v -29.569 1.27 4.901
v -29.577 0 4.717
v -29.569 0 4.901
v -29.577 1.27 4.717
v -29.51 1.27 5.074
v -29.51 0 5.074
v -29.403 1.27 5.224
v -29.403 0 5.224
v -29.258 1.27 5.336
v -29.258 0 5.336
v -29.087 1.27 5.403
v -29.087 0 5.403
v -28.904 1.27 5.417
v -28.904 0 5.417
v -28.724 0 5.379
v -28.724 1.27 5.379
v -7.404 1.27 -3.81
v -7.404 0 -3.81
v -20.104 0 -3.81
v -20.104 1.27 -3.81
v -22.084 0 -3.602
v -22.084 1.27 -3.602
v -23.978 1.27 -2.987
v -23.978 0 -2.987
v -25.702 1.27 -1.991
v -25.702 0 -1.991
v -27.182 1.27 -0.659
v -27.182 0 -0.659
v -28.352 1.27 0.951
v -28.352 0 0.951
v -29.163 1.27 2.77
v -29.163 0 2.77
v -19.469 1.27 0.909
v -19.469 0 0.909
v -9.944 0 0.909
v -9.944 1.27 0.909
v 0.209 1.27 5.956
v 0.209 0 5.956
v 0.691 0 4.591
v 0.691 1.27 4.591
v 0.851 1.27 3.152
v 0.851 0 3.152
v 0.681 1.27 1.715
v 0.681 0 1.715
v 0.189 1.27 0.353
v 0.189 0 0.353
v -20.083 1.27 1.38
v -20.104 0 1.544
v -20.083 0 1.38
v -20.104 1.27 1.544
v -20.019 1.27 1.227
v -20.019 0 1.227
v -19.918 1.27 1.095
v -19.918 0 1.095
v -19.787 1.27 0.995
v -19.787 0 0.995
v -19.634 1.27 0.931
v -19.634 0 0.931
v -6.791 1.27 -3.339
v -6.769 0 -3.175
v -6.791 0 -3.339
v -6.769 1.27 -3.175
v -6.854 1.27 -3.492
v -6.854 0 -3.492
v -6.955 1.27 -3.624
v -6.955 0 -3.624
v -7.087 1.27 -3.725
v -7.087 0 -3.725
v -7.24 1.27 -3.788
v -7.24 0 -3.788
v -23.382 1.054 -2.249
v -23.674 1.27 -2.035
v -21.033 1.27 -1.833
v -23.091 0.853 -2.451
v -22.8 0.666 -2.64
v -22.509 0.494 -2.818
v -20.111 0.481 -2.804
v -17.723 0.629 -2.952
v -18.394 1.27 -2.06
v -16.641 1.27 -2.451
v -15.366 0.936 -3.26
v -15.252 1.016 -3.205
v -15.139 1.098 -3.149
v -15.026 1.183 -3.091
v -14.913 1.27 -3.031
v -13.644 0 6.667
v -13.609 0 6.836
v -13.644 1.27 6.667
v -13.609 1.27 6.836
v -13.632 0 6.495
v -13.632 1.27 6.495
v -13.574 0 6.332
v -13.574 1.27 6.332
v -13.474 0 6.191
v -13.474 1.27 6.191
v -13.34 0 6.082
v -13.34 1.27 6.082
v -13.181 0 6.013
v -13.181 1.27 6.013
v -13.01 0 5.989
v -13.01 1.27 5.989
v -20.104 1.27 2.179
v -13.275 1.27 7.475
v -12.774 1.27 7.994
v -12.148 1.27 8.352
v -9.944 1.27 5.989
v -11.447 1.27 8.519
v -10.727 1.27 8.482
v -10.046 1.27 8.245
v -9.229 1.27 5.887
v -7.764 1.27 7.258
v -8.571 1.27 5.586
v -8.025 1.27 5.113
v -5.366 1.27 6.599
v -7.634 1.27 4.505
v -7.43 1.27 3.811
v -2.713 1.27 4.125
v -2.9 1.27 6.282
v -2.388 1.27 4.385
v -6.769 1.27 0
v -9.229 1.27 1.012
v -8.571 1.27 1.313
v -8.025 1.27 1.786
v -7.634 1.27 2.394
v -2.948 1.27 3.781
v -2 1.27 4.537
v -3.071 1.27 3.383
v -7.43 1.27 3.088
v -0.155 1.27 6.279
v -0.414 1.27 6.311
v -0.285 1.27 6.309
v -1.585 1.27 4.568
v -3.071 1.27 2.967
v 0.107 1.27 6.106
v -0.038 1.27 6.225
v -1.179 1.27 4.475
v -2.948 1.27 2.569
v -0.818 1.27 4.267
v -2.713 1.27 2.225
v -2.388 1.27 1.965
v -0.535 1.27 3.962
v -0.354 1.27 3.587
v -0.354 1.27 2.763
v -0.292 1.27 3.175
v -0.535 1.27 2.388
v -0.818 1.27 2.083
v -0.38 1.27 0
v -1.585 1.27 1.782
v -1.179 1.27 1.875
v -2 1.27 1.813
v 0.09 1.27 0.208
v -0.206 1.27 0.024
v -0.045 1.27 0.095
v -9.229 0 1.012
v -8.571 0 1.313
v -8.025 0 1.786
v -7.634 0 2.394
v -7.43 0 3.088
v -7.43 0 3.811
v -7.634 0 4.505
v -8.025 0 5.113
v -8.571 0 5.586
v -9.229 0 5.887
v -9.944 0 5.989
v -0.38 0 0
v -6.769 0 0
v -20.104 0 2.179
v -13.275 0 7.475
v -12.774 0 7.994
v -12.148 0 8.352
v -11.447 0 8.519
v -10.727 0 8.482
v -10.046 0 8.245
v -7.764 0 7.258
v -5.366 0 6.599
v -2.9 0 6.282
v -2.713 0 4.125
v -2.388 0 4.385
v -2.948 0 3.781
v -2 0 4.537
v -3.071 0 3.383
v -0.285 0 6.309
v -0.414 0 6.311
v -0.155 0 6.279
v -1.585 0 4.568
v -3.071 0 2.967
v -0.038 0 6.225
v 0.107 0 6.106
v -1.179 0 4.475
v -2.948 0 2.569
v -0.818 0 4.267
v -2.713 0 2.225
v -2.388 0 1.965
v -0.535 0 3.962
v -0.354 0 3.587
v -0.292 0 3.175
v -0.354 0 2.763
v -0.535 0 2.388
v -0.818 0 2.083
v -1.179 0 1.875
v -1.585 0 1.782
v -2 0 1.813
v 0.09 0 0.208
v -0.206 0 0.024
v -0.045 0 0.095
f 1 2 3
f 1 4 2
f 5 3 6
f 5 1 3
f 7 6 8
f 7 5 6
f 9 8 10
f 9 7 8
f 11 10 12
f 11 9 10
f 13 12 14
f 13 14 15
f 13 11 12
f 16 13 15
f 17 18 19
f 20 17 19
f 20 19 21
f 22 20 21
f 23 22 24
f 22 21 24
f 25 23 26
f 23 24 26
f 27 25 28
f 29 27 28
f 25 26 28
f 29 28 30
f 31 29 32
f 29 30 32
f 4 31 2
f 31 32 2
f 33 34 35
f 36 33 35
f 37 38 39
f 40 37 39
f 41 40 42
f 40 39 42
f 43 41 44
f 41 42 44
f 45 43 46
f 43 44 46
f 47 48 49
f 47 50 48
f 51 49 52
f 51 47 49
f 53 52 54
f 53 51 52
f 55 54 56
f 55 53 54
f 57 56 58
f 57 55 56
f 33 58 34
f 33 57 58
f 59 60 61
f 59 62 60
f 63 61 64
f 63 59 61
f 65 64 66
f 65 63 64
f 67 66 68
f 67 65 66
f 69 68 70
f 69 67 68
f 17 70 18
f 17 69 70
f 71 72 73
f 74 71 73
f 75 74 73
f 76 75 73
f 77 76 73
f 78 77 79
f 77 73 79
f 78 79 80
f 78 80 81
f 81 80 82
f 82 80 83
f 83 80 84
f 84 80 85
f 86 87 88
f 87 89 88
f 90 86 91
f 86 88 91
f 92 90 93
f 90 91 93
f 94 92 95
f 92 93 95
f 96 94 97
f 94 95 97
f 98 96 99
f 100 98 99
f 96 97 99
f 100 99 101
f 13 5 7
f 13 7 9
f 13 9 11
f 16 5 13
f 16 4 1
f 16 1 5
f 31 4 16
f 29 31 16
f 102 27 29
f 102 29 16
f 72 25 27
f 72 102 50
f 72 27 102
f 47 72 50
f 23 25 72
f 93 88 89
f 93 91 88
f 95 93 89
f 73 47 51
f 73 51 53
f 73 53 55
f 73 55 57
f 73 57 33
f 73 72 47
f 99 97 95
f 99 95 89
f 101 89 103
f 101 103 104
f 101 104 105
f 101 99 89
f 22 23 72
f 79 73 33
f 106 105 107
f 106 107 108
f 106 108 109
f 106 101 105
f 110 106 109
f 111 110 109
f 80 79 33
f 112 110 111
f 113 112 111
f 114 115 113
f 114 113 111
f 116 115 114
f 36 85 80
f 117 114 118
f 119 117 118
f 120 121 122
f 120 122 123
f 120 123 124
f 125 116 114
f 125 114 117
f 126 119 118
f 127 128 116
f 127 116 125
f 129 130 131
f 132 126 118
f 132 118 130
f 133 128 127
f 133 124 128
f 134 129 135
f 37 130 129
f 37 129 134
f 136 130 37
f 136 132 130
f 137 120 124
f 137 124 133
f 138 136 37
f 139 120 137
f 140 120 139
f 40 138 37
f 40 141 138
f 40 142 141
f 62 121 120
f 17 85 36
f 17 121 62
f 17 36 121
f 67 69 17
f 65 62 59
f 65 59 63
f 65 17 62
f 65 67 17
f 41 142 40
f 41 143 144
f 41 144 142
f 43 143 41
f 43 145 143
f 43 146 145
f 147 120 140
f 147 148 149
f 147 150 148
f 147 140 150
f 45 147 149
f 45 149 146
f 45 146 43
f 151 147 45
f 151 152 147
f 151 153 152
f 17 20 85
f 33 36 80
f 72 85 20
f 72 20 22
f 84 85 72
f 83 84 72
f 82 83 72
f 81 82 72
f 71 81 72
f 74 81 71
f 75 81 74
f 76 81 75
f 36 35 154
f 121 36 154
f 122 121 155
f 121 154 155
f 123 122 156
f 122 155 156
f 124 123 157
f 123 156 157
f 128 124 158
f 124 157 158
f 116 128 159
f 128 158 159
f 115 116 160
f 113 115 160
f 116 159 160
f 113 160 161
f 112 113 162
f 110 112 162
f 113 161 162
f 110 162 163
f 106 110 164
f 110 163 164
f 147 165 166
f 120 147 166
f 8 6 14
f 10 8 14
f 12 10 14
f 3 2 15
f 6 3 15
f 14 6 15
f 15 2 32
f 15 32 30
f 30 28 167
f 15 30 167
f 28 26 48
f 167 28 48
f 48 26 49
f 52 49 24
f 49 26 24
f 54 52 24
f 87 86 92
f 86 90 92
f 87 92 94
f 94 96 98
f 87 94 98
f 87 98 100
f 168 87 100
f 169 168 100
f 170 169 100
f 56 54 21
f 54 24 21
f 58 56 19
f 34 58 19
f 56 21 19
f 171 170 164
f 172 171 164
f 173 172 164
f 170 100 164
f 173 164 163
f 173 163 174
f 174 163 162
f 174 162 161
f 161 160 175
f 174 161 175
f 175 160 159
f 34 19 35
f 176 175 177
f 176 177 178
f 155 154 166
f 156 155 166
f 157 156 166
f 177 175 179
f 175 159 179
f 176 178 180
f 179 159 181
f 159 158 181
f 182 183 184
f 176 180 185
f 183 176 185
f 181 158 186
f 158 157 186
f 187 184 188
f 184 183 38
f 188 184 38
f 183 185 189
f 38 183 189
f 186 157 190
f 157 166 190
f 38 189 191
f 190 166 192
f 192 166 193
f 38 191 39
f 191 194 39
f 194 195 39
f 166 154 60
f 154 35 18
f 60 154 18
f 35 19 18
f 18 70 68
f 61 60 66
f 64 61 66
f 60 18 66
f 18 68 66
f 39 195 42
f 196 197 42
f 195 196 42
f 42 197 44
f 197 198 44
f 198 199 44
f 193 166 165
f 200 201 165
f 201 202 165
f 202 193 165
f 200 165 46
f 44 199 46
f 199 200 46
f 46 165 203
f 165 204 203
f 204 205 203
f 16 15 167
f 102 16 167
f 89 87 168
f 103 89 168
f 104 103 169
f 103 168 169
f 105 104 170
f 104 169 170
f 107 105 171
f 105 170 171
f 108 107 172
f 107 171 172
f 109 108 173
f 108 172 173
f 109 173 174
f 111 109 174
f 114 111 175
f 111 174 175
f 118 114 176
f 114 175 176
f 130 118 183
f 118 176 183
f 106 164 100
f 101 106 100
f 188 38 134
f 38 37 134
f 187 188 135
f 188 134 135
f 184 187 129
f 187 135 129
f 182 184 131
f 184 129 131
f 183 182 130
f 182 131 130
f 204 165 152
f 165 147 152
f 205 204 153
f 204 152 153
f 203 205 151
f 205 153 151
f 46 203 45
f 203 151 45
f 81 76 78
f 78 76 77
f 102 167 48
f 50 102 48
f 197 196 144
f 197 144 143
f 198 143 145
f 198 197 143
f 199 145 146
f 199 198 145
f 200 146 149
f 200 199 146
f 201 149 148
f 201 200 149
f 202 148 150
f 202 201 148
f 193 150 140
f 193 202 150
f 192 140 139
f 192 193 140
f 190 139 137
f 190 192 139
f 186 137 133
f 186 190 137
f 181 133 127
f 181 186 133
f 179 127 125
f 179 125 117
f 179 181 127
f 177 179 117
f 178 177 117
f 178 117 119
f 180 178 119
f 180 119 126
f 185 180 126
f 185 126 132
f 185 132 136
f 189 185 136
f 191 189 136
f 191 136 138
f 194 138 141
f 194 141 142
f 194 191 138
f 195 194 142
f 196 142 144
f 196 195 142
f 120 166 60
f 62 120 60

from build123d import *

# Parameters (mm, degrees)
SKETCH1_R           = 1.397
BOSS_EXTRUDE1_DEPTH = 1.27
FILLET1_R           = 0.635
CUT_EXTRUDE3_DEPTH  = 2.286
CUT_EXTRUDE3_DRAFT  = -5


with BuildPart() as part:
    # Sketch1 → Boss-Extrude1 (new body)
    with BuildSketch(Plane(origin=(0, 0, 0), x_dir=(1, 0, 0), z_dir=(0, 1, 0))):
        with BuildLine():
            Line((0, 0), (-6.769261314, 0))
            Line((-6.769261314, 0), (-6.769261314, 3.81))
            Line((-6.769261314, 3.81), (-20.104261314, 3.81))
            ThreePointArc((-20.104261314, 3.81), (-26.839453405, 1.020192091), (-29.629261314, -5.715))
            Line((-29.629261314, -5.715), (-20.104261314, -2.17946963))
            Line((-20.104261314, -2.17946963), (-20.104261314, -0.90946963))
            Line((-20.104261314, -0.90946963), (-9.944261314, -0.90946963))
            ThreePointArc((-9.944261314, -0.90946963), (-7.404261314, -3.44946963), (-9.944261314, -5.98946963))
            Line((-9.944261314, -5.98946963), (-13.754261314, -5.98946963))
            ThreePointArc((-13.754261314, -5.98946963), (-12.534056747, -8.159663173), (-10.045804609, -8.244754297))
            ThreePointArc((-10.045804609, -8.244754297), (-5.162016489, -6.559807155), (0, -6.35))
            ThreePointArc((0, -6.35), (0.850738686, -3.175), (0, 0))
        make_face()
        with Locations((-1.689261314, -3.175)):
            Circle(SKETCH1_R, mode=Mode.SUBTRACT)
    extrude(amount=BOSS_EXTRUDE1_DEPTH)

    # Fillet1
    fillet1_edges = [part.edges().sort_by_distance(p)[0] for p in [
        (0, 0.635, 6.35),
        (-13.754261314, 0.635, 5.98946963),
        (-20.104261314, 0.635, 0.90946963),
        (-29.629261314, 0.635, 5.715),
        (-6.769261314, 0.635, -3.81),
        (0, 0.635, 0),
    ]]
    fillet(fillet1_edges, radius=FILLET1_R)


with BuildPart() as cut_extrude3_tool:
    # Sketch3 → Cut-Extrude3 (with draft: the straight prism first)
    with BuildSketch(Plane(origin=(0, 0.454734815, 0.454734815), x_dir=(1, 0, 0), z_dir=(0, 0.707106781, 0.707106781))):
        with BuildLine():
            ThreePointArc((-24.669594842, 2.353522249), (-18.89739116, 2.199678883), (-13.239594842, 3.353517673))
            Line((-13.239594842, 3.353517673), (-24.669594842, 2.353522249))
        make_face()
    extrude(amount=-CUT_EXTRUDE3_DEPTH)
    # Cut-Extrude3: the draft: its side faces are tilted about the plane it starts from
    cut_extrude3_sides = [cut_extrude3_tool.faces().sort_by_distance(p)[0] for p in [
        (-18.89739116, 1.201919619, -1.908896091),
        (-18.954594842, 1.664255078, -2.371231551),
    ]]
    draft(cut_extrude3_sides, Plane(origin=(0, 0.454734815, 0.454734815), x_dir=(1, 0, 0), z_dir=(0, 0.707106781, 0.707106781)), CUT_EXTRUDE3_DRAFT)


with BuildPart() as part_1:
    add(part.part)

    # Cut-Extrude3: cut by cut_extrude3_tool
    add(cut_extrude3_tool.part, mode=Mode.SUBTRACT)


solid = part_1.part
